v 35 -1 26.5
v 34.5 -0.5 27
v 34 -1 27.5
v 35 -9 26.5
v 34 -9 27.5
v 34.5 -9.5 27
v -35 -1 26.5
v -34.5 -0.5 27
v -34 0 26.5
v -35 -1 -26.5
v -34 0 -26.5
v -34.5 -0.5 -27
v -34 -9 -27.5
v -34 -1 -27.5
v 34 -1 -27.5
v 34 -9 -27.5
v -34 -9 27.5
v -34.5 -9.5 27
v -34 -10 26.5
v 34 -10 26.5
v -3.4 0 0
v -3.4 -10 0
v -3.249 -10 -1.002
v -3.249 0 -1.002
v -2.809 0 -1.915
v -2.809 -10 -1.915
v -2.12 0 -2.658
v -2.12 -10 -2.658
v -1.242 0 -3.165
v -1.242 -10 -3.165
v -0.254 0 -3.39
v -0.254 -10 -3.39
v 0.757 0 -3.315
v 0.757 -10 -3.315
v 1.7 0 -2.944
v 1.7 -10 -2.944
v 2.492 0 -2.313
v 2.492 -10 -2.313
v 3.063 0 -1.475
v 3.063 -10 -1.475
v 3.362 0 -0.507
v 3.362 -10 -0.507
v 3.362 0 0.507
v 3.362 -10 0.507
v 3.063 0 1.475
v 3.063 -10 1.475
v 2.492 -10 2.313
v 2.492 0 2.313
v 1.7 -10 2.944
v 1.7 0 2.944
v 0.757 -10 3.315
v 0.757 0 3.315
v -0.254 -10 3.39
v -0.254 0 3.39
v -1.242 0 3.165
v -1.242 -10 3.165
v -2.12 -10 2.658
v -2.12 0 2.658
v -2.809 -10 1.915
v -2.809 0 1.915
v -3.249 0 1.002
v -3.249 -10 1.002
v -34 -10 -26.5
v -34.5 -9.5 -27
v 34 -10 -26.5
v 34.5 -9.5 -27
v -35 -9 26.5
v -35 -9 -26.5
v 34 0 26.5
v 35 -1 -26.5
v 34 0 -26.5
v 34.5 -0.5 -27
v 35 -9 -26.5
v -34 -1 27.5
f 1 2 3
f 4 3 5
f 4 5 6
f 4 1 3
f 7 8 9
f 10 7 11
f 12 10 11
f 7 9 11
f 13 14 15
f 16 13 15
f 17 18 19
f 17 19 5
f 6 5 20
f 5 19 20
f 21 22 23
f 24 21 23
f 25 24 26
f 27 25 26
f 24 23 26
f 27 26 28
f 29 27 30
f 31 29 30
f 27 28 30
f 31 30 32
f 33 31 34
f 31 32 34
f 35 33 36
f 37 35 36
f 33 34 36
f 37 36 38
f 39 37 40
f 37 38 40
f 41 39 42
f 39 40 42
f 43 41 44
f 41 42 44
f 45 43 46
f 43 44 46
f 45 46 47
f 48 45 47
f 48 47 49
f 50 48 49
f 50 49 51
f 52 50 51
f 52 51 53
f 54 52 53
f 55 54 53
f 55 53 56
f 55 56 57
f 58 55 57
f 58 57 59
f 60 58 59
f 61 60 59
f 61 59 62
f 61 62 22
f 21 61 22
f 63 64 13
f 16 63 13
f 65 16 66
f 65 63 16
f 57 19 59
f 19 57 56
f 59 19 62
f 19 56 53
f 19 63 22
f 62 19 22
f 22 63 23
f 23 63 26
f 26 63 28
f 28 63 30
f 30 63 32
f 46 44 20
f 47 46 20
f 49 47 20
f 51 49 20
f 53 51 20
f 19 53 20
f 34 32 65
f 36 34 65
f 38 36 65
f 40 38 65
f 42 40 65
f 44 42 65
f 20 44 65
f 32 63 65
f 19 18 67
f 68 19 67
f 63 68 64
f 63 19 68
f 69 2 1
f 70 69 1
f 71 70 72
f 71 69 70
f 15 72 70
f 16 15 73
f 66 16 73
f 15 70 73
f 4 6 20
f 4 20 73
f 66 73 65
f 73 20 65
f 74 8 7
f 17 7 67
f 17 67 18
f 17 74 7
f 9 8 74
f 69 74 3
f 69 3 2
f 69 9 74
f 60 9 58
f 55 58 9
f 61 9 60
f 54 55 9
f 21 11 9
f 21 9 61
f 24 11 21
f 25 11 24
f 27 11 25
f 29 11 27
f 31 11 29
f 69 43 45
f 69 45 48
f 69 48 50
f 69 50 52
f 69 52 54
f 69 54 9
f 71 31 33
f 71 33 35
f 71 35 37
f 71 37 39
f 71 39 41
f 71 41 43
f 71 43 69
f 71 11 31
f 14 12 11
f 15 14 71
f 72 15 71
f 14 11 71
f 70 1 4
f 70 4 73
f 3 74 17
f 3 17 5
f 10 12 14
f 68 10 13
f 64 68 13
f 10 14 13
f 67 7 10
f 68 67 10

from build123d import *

# Parameters (mm, degrees)
SKETCH1_W           = 70
SKETCH1_H           = 55
BOSS_EXTRUDE1_DEPTH = 10
CHAMFER1_SIZE       = 1
M8_TAPPED_HOLE1_D   = 6.8
CHAMFER3_SIZE       = 1


with BuildPart() as part:
    # Sketch1 → Boss-Extrude1 (new body)
    with BuildSketch(Plane(origin=(0, 0, 0), x_dir=(1, 0, 0), z_dir=(0, 1, 0))):
        Rectangle(SKETCH1_W, SKETCH1_H)
    extrude(amount=-BOSS_EXTRUDE1_DEPTH)

    # Chamfer1
    chamfer1_edges = [part.edges().sort_by_distance(p)[0] for p in [
        (-35, -10, 0),
        (0, -10, 27.5),
        (35, -10, 0),
        (0, 0, 27.5),
        (-35, 0, 0),
        (0, 0, -27.5),
        (35, 0, 0),
        (0, -10, -27.5),
    ]]
    chamfer(chamfer1_edges, length=CHAMFER1_SIZE)

    # M8 Tapped Hole1 (through all)
    with Locations(Plane(origin=(0, 0, 0), x_dir=(1, 0, 0), z_dir=(0, 1, 0))):
        with Locations((0, 0)):
            Hole(M8_TAPPED_HOLE1_D / 2)

    # Chamfer3
    chamfer3_edges = [part.edges().sort_by_distance(p)[0] for p in [
        (35, -5, -27.5),
        (-35, -5, -27.5),
        (-35, -5, 27.5),
        (35, -5, 27.5),
    ]]
    chamfer(chamfer3_edges, length=CHAMFER3_SIZE)


solid = part.part
